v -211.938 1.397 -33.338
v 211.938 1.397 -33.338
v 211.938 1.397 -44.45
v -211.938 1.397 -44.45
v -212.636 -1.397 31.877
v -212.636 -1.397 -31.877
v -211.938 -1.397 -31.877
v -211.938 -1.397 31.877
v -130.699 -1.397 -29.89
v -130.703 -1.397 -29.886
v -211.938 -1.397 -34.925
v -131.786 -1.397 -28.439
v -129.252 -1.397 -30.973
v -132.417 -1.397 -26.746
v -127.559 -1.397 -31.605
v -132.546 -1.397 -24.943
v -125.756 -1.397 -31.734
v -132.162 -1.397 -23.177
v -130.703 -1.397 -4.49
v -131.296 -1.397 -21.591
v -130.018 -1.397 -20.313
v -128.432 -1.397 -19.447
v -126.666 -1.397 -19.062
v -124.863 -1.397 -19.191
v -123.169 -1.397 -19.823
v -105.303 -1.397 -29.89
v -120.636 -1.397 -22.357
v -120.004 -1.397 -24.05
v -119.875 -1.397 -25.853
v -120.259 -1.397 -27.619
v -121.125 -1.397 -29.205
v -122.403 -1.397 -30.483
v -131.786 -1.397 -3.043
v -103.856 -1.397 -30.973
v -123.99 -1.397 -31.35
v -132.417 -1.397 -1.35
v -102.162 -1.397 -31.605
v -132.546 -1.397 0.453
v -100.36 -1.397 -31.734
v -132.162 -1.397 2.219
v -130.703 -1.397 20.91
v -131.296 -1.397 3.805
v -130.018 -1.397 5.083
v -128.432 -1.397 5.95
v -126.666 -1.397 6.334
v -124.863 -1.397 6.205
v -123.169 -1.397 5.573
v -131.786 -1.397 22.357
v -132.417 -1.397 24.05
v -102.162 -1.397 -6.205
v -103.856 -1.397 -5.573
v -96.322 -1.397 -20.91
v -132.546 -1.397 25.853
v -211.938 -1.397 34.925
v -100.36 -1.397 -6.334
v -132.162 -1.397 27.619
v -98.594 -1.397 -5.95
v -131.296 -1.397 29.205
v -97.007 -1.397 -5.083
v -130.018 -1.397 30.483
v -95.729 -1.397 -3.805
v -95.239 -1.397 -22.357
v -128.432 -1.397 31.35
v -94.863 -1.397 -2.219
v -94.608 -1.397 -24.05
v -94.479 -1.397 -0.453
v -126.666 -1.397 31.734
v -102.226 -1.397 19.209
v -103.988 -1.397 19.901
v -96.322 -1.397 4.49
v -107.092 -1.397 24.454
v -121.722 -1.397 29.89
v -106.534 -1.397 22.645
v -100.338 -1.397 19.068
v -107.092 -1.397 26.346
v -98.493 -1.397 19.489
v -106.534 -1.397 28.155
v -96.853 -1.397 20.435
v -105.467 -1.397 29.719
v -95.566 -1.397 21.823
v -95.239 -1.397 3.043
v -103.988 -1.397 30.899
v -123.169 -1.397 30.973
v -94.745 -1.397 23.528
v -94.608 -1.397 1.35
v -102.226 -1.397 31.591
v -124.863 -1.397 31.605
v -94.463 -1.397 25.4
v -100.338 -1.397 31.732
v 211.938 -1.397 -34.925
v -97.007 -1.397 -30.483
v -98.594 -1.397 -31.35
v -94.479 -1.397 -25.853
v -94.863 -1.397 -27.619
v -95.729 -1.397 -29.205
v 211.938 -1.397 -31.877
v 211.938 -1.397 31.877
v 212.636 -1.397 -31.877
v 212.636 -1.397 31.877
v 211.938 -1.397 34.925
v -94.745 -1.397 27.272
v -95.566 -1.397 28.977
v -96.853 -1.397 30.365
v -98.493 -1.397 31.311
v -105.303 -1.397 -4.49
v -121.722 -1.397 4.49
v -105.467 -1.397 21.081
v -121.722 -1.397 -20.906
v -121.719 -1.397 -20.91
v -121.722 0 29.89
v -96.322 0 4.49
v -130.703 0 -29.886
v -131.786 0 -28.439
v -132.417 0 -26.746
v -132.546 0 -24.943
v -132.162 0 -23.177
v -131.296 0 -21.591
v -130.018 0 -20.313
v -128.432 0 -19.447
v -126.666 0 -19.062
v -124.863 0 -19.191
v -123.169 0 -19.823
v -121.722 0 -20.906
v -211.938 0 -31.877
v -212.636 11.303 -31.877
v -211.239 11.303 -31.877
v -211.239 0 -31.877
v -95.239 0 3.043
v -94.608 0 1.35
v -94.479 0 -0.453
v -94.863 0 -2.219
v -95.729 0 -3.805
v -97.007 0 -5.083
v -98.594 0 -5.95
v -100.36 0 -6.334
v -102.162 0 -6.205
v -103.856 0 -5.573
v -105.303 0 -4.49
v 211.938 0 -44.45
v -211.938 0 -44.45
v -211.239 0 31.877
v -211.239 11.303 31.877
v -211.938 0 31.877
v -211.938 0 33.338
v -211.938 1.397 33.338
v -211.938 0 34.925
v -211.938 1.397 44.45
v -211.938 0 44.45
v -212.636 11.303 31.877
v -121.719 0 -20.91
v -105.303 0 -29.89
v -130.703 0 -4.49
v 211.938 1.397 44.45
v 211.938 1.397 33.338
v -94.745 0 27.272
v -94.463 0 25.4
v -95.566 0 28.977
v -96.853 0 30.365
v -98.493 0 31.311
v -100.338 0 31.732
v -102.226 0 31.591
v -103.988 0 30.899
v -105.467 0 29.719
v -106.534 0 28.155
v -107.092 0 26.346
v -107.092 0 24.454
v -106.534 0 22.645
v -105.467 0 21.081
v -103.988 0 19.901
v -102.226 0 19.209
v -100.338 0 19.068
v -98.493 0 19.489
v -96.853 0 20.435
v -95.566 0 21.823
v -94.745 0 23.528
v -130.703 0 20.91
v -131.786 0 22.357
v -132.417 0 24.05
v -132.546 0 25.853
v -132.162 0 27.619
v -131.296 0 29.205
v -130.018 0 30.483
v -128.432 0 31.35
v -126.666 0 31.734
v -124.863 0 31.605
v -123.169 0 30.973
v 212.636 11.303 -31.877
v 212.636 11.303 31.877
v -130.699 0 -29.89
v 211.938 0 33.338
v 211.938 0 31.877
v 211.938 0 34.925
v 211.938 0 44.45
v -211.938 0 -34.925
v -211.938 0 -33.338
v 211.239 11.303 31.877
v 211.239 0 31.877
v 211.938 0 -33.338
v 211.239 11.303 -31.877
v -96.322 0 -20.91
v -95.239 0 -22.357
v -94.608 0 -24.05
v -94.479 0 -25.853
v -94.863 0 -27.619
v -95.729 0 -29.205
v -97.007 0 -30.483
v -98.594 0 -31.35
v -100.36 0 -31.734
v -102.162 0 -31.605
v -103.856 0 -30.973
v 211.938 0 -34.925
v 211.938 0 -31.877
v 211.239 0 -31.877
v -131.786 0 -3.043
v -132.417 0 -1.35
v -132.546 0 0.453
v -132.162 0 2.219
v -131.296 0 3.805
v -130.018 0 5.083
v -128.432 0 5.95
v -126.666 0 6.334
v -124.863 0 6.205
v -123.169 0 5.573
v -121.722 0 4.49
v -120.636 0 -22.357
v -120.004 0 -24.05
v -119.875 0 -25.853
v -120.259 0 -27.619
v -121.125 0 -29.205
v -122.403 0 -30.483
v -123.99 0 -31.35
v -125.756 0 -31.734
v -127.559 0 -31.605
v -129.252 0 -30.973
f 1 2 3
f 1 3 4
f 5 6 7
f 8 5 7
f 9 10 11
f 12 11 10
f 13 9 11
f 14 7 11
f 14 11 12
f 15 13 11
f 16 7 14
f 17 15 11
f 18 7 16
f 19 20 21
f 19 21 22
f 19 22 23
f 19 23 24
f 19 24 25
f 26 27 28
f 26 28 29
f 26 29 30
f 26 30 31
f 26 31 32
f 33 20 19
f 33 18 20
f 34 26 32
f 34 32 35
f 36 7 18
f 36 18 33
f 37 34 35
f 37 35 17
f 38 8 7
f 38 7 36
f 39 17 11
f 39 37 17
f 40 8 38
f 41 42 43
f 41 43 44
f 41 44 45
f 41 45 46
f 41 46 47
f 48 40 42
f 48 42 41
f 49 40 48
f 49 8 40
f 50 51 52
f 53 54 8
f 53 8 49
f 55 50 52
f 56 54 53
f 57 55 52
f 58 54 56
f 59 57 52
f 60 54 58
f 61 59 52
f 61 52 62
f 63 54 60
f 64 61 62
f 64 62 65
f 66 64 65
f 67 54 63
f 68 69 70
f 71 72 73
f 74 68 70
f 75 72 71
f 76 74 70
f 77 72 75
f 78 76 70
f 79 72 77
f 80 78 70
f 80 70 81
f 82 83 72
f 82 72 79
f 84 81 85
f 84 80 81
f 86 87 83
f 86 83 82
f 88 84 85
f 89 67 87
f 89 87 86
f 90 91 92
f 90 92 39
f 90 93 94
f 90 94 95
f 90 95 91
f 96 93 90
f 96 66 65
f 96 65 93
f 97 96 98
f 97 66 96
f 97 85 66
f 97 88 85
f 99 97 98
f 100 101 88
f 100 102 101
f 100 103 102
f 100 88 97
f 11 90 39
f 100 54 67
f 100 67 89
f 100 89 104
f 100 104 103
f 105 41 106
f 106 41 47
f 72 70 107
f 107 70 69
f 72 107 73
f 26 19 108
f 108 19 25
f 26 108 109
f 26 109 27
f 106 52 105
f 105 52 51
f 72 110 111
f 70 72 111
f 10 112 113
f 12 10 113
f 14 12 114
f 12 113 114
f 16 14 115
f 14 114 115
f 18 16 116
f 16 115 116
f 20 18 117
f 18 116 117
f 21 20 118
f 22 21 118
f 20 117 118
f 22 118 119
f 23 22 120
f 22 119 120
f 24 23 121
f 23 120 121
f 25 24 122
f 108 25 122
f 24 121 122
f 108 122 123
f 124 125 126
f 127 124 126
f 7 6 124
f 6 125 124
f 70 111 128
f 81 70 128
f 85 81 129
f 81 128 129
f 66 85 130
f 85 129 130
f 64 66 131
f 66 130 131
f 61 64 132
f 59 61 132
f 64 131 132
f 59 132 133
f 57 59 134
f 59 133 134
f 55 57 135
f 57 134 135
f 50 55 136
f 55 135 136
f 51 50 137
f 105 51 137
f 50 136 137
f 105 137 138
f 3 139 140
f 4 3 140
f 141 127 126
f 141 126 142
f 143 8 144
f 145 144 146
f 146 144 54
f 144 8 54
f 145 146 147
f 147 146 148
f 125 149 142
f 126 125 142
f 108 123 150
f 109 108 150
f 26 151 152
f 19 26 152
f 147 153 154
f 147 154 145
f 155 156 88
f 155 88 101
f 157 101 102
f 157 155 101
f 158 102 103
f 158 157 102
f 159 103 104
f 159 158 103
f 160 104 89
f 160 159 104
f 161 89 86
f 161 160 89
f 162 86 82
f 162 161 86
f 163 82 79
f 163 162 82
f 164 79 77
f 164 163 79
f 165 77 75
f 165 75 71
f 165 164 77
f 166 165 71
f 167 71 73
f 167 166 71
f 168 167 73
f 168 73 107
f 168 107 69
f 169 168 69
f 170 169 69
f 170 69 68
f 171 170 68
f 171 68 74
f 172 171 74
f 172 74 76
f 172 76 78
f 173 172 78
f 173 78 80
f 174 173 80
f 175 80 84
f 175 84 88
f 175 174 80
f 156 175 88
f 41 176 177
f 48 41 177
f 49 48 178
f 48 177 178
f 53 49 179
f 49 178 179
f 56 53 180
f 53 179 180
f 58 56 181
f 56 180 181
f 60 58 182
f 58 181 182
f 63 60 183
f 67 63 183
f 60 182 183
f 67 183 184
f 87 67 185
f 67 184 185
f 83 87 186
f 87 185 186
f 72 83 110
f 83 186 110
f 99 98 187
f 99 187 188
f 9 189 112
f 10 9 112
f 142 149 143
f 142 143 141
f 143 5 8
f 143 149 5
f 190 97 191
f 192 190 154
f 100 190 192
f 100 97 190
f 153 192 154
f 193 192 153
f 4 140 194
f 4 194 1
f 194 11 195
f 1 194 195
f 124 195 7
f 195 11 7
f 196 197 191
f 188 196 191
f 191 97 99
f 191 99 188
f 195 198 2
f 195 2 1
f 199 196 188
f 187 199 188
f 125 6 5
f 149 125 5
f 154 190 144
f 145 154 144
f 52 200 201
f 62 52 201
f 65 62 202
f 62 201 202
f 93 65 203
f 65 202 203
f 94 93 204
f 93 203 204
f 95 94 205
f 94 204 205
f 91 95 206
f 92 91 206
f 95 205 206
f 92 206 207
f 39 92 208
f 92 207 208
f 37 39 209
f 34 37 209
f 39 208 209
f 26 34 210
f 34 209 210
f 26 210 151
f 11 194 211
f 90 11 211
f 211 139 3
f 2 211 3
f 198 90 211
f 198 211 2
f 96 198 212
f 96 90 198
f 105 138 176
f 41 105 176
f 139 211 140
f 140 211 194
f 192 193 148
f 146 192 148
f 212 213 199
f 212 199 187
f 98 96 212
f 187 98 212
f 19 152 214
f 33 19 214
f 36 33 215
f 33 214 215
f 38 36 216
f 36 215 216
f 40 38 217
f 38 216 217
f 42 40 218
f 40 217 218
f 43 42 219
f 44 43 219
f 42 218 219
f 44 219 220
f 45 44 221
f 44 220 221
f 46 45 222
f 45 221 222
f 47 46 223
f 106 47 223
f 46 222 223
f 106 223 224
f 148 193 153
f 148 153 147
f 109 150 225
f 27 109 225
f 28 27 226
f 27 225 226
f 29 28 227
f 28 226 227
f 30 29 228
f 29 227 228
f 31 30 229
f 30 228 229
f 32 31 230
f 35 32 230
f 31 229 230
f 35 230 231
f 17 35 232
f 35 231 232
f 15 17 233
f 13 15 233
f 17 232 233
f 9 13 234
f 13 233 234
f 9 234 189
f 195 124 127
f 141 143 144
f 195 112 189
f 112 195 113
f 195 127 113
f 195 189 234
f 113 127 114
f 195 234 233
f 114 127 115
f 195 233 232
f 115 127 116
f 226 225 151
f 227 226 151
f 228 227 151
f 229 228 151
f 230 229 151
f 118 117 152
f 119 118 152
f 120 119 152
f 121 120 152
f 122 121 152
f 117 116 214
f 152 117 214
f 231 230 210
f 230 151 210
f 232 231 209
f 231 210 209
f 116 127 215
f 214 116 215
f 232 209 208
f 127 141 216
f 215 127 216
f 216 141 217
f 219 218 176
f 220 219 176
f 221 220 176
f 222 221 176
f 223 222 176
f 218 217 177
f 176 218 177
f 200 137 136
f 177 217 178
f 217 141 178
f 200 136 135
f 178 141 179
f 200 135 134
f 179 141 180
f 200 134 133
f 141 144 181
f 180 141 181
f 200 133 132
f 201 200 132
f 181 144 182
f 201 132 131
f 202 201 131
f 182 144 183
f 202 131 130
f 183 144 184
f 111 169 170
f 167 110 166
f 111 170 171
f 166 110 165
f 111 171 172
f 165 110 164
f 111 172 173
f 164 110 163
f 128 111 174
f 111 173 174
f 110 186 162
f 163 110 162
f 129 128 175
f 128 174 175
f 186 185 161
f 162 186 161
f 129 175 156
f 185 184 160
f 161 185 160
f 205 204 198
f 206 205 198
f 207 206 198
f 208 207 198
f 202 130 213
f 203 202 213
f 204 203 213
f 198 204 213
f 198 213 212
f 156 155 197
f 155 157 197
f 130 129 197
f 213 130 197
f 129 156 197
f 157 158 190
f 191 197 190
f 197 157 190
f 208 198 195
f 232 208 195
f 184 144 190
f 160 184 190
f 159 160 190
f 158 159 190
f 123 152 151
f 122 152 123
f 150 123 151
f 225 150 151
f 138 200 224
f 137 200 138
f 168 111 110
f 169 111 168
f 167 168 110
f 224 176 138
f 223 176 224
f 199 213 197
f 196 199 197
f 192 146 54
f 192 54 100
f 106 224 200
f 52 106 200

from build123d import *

# Parameters (mm, degrees)
F0_W     = 423.8752
F0_H     = 69.85
F0_R     = 6.35
F1_DEPTH = 1.397
F2_W     = 423.8752
F2_H     = 11.1125
F3_DEPTH = 1.397
F4_W     = 1.397
F4_H     = 63.754
F5_DEPTH = 12.7


with BuildPart() as f1:
    # F0 (on Front) → F1 (new body)
    with BuildSketch(Plane.XZ):
        Rectangle(F0_W, F0_H)
        with BuildLine():
            ThreePointArc((-130.702728, -29.886292), (-130.702728, -20.906036), (-121.722472, -20.906036))
            Line((-121.722472, -20.906036), (-121.718636, -20.909872))
            ThreePointArc((-121.718636, -20.909872), (-121.718636, -29.890128), (-130.698892, -29.890128))
            Line((-130.698892, -29.890128), (-130.702728, -29.886292))
        make_face(mode=Mode.SUBTRACT)
        with BuildLine():
            ThreePointArc((-130.702728, -4.490128), (-130.702728, 4.490128), (-121.722472, 4.490128))
            Line((-121.722472, 4.490128), (-96.322472, -20.909872))
            ThreePointArc((-96.322472, -20.909872), (-96.322472, -29.890128), (-105.302728, -29.890128))
            Line((-105.302728, -29.890128), (-130.702728, -4.490128))
        make_face(mode=Mode.SUBTRACT)
        with BuildLine():
            ThreePointArc((-96.322472, 4.490128), (-96.322472, -4.490128), (-105.302728, -4.490128))
            Line((-105.302728, -4.490128), (-130.702728, 20.909872))
            ThreePointArc((-130.702728, 20.909872), (-130.702728, 29.890128), (-121.722472, 29.890128))
            Line((-121.722472, 29.890128), (-96.322472, 4.490128))
        make_face(mode=Mode.SUBTRACT)
        with Locations((-100.8126, 25.4)):
            Circle(F0_R, mode=Mode.SUBTRACT)
    extrude(amount=F1_DEPTH)

    # F2 (on face) → F3 (join)
    with BuildSketch(Plane(origin=(0, 0, 0), x_dir=(-1, 0, 0), z_dir=(0, 1, 0))):
        with Locations((0, 38.89375)):
            Rectangle(F2_W, F2_H)
        with Locations((0, -38.89375)):
            Rectangle(F2_W, F2_H)
    extrude(amount=F3_DEPTH)

    # F4 (on face) → F5 (join)
    with BuildSketch(Plane.XZ.offset(1.397)):
        with Locations((-211.9376, 0)):
            Rectangle(F4_W, F4_H)
        with Locations((211.9376, 0)):
            Rectangle(F4_W, F4_H)
    extrude(amount=-F5_DEPTH)


solid = f1.part
